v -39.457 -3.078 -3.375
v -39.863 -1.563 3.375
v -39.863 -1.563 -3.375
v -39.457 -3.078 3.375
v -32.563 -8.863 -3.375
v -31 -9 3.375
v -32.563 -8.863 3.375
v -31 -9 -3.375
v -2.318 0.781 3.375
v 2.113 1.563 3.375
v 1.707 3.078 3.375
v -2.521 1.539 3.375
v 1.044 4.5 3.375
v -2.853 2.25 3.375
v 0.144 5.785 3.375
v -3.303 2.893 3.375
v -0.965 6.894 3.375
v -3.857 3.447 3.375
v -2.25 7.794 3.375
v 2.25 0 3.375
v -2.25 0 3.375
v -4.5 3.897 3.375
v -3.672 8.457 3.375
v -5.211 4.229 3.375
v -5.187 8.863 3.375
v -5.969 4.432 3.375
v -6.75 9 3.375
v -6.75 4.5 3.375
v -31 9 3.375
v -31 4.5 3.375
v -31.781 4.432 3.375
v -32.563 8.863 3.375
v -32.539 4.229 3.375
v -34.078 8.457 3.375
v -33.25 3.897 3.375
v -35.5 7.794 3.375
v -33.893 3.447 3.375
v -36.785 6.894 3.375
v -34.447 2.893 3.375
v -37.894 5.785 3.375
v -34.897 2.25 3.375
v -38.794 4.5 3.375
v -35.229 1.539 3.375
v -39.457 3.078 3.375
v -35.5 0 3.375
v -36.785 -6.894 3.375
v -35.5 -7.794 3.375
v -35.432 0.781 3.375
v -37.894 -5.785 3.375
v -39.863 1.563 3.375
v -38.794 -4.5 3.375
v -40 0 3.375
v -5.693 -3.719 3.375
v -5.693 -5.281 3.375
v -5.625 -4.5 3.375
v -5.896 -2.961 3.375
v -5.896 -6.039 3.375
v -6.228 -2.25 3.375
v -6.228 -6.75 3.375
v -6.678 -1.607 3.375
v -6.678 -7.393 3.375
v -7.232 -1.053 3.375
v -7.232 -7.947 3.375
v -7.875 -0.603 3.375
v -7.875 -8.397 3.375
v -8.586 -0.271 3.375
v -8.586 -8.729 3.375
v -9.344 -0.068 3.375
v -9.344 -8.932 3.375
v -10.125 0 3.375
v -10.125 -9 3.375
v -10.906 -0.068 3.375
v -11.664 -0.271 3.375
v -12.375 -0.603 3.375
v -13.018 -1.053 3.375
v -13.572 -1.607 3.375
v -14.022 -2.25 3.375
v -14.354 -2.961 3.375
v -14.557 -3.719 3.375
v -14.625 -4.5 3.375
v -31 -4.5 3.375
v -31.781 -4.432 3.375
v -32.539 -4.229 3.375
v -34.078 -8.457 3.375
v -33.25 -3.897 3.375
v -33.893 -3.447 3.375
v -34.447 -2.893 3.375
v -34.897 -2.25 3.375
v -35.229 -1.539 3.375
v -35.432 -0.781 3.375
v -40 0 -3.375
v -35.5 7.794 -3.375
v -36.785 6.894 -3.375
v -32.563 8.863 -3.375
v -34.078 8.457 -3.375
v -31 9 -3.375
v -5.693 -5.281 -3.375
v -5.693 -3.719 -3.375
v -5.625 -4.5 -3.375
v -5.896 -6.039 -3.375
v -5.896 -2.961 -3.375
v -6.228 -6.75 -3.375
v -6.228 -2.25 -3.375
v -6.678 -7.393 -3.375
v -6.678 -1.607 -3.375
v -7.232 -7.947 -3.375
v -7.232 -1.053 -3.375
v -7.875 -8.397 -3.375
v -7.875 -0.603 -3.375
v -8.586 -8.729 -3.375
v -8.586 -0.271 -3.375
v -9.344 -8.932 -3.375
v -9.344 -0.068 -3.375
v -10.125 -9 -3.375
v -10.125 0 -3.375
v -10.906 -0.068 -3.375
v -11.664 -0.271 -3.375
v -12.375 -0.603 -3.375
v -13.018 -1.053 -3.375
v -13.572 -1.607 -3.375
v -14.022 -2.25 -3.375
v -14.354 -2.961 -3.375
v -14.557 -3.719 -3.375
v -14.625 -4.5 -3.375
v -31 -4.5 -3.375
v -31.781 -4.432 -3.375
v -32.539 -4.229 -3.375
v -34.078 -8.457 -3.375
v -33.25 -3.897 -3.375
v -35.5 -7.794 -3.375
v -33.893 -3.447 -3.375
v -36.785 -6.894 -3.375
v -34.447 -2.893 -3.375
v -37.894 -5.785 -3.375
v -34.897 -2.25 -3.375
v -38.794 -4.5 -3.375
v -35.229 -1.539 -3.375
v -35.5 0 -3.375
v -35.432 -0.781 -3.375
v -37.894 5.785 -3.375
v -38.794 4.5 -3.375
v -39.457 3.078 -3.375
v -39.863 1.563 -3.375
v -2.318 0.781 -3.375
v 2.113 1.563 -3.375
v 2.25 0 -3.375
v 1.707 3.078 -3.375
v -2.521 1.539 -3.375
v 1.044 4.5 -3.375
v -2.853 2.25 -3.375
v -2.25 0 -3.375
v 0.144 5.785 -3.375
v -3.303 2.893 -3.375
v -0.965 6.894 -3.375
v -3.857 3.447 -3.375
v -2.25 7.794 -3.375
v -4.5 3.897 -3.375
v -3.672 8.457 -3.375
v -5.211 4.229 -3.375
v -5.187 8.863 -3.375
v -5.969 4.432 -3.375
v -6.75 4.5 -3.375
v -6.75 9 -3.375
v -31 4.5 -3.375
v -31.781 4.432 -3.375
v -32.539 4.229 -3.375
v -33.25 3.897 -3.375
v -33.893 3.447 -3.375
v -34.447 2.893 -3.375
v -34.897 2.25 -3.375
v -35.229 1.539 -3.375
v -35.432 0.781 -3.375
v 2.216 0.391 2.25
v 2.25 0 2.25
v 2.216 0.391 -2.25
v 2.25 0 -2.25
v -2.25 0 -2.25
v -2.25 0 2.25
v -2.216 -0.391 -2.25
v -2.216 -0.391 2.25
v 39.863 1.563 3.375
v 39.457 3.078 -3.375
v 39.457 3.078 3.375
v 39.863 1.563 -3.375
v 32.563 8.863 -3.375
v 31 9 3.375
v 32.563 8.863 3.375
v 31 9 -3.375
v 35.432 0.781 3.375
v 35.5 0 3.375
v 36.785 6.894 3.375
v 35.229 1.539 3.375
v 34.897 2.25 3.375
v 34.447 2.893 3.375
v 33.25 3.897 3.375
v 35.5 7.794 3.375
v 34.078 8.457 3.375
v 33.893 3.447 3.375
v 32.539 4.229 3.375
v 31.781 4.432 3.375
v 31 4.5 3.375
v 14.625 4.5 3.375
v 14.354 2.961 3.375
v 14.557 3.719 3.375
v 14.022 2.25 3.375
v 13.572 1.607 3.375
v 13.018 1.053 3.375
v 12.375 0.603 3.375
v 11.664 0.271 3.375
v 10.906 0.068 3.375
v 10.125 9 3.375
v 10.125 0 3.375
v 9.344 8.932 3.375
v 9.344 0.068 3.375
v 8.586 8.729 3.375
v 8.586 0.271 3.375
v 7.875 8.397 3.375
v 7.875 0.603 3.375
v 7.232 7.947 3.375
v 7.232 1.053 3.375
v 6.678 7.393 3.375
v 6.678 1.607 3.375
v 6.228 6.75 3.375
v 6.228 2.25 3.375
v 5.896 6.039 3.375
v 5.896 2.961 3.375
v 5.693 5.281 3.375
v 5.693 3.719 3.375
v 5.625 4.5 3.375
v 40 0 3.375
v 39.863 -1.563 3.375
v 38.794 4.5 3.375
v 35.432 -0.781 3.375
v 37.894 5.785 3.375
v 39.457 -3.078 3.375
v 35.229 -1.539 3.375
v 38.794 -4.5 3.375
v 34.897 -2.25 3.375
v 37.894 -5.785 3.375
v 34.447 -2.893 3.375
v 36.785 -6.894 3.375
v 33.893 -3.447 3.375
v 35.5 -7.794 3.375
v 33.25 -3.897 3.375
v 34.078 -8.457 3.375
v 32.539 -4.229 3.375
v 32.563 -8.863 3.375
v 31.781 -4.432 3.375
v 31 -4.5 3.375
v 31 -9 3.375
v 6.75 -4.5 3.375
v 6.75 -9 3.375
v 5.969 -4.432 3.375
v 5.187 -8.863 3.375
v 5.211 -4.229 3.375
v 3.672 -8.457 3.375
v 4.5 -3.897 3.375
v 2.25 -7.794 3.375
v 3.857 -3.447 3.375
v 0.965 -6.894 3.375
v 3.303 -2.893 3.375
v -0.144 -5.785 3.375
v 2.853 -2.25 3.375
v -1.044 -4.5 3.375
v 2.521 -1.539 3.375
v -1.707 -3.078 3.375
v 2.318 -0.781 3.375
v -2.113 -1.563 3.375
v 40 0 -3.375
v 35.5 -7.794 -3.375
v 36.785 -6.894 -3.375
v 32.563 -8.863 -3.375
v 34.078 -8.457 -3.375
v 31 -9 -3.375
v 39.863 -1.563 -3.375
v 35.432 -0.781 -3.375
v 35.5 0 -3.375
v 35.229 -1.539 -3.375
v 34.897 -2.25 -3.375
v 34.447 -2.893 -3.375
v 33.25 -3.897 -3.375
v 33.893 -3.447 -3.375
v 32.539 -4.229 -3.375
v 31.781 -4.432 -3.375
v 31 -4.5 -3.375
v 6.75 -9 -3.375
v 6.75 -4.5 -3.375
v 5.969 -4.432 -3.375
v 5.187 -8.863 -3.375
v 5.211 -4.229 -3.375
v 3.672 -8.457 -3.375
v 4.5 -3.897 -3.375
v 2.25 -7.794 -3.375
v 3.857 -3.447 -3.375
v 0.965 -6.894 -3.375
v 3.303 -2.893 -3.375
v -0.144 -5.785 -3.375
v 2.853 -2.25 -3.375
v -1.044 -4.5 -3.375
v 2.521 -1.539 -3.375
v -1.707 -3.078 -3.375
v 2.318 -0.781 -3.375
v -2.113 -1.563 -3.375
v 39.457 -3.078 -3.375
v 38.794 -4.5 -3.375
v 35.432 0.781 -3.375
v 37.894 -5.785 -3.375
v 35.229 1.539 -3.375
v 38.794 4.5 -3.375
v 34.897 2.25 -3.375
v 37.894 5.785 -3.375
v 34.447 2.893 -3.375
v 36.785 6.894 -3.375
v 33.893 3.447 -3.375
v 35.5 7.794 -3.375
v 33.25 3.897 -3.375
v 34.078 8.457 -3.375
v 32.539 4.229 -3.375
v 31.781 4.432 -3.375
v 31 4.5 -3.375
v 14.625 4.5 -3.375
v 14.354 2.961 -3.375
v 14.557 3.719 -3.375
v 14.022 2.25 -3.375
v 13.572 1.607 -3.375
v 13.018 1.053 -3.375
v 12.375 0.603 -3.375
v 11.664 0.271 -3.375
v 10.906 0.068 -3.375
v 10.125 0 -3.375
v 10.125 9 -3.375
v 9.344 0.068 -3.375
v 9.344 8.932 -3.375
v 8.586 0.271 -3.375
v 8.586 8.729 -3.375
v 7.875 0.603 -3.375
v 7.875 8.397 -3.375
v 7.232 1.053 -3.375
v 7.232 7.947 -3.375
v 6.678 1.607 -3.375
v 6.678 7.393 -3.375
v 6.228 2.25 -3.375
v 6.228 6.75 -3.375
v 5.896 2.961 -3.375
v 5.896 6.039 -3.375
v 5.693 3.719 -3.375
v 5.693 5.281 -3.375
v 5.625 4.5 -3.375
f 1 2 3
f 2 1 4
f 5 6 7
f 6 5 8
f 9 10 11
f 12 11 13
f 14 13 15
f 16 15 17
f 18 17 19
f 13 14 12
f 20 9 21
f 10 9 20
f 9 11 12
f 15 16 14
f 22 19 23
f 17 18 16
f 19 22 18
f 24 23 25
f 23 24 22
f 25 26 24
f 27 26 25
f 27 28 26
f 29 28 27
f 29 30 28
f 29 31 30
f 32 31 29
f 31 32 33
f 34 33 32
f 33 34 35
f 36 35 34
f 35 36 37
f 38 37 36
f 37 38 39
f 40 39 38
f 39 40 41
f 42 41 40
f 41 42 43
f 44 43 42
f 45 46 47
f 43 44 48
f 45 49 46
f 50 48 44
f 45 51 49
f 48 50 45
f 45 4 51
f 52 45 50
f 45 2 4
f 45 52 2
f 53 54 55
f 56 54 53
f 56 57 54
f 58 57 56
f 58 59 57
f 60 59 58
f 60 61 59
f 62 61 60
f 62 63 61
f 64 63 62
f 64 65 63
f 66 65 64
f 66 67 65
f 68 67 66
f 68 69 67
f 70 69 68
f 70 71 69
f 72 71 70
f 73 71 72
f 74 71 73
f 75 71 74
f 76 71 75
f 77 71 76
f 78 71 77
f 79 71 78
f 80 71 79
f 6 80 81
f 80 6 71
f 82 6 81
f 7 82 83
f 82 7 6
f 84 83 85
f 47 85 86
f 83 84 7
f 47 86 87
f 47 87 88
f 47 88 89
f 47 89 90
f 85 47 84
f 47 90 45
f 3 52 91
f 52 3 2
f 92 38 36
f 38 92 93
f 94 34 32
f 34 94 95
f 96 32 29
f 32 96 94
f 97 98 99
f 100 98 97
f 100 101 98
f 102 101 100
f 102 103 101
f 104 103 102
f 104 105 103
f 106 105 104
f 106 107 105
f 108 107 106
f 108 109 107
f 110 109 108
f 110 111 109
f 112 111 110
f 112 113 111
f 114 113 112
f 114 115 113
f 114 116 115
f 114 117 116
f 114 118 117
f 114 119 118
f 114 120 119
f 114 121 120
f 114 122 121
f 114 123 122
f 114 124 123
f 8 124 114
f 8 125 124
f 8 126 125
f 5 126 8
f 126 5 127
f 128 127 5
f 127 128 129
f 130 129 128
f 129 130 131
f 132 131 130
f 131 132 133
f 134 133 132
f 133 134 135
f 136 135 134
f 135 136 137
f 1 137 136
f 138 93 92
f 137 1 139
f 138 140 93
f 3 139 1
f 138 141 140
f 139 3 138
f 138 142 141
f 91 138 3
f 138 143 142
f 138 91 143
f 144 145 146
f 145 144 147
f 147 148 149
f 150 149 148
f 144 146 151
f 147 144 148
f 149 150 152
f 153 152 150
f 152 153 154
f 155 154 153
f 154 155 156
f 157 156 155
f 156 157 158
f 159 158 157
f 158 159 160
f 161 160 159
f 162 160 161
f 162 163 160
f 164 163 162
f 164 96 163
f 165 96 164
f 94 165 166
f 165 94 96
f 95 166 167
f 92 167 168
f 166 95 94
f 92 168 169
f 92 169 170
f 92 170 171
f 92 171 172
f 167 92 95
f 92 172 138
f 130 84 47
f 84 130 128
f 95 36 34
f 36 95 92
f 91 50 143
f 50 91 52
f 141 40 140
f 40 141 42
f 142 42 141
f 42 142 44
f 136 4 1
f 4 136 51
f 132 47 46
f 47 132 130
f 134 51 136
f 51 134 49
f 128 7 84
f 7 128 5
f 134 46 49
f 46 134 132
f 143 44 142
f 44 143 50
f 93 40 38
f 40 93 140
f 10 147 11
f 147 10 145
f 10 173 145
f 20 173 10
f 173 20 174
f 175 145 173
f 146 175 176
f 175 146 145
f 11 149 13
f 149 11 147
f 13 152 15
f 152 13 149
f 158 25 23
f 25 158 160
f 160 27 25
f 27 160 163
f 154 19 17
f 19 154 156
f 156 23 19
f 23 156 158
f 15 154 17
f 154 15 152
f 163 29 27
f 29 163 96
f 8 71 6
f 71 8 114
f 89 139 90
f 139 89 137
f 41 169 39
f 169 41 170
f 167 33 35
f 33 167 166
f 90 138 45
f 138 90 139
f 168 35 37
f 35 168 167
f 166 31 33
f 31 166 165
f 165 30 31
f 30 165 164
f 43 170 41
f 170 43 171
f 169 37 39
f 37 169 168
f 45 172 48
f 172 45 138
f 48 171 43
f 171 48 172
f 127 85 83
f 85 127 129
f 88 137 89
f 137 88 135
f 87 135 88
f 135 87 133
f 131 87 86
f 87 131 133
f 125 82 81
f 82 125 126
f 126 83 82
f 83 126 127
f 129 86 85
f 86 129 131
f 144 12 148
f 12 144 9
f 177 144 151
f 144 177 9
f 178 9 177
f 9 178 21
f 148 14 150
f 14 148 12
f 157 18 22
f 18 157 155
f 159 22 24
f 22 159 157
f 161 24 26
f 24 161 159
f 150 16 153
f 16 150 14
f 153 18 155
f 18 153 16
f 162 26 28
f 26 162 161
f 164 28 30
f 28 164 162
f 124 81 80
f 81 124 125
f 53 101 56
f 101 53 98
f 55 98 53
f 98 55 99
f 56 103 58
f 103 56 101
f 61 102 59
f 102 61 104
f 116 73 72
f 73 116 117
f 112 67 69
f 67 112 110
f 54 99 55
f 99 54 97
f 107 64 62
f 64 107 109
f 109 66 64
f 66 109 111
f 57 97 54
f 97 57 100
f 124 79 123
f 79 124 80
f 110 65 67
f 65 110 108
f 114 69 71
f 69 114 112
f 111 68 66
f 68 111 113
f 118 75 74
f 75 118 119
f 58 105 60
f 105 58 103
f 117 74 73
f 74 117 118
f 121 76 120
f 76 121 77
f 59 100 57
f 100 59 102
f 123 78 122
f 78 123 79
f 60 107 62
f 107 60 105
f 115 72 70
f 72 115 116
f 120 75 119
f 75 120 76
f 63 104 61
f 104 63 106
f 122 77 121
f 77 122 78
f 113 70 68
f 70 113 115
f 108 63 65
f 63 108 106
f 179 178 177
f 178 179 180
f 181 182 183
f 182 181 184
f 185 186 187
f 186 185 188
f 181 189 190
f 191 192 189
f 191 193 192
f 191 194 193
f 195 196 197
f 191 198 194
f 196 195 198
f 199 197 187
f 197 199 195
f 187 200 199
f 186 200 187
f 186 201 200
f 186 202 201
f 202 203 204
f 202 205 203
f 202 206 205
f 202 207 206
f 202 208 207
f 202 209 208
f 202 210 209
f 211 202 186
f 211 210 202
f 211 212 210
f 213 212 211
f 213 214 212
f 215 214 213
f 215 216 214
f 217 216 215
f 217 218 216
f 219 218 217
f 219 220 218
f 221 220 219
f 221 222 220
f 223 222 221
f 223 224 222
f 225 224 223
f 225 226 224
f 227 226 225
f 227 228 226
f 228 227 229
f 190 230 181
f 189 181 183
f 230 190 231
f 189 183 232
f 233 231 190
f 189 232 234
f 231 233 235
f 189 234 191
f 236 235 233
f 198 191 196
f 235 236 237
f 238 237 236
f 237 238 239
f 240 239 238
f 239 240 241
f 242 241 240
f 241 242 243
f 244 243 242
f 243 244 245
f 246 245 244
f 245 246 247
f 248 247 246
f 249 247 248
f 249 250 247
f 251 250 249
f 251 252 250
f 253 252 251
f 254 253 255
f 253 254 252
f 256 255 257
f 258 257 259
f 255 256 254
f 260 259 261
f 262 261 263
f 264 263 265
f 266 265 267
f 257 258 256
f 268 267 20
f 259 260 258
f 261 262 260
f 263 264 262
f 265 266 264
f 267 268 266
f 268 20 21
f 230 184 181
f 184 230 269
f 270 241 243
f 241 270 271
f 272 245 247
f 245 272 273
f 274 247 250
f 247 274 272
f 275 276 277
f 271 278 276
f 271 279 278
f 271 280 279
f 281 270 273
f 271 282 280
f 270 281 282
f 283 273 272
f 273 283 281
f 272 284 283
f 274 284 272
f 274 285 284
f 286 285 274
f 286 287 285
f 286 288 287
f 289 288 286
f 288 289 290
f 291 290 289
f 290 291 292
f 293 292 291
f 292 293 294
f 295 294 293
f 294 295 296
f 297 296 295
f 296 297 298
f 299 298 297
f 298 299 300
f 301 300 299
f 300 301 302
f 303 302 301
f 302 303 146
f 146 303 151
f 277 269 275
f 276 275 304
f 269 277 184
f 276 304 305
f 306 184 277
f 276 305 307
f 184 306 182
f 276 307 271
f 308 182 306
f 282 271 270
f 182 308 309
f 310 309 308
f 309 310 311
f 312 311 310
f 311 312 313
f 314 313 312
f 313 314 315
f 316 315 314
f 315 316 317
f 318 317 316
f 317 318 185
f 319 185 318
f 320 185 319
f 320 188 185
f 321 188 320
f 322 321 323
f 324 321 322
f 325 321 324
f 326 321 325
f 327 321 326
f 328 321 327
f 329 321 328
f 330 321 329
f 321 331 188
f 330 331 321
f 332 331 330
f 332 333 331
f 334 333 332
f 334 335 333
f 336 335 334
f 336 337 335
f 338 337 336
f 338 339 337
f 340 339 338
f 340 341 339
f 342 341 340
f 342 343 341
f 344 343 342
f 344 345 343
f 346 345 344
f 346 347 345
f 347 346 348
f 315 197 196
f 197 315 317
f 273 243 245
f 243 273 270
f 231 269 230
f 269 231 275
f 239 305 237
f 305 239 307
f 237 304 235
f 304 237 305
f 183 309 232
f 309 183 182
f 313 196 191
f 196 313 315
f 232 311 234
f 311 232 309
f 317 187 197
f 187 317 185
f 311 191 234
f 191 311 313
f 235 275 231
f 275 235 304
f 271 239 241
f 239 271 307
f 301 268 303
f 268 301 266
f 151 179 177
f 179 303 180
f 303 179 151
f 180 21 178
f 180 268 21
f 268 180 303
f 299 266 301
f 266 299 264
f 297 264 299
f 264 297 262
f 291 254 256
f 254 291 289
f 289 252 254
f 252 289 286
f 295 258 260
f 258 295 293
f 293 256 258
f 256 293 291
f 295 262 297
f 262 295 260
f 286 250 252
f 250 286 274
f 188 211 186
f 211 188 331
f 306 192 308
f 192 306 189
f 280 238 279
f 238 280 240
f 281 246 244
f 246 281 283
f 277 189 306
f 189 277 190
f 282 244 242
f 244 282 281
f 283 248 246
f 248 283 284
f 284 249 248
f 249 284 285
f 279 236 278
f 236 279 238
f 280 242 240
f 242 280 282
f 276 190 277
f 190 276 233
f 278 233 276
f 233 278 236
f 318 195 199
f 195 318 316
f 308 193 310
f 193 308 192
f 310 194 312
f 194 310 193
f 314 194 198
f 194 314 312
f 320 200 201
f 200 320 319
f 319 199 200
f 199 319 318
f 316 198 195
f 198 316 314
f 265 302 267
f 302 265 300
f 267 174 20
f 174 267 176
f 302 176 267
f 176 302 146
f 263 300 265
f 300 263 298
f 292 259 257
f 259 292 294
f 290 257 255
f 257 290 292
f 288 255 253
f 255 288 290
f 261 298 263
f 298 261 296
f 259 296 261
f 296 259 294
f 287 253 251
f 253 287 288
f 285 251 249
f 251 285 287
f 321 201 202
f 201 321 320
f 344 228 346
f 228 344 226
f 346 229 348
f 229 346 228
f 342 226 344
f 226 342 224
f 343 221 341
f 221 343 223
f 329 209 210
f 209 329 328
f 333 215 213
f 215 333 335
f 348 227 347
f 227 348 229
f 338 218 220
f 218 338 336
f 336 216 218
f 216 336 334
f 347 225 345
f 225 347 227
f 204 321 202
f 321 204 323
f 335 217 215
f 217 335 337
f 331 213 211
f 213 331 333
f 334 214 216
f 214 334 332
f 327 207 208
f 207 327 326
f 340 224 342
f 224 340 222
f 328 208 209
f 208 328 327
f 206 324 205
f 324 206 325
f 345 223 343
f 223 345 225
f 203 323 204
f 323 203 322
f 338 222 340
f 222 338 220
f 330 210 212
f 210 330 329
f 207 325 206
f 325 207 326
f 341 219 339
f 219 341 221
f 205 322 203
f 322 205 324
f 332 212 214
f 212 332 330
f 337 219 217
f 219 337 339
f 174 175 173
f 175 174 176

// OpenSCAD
// Backpack Cord Clip
// This clip will hold together your backpack cords in the center of your chest
// so the cords will not slip from your soulder.

// (mm)
Total_Length=80; // [10:200]
// (mm)
Cord_Diameter=9; // [1:20]

Inner_Length=(Total_Length/2)-Cord_Diameter*2+Cord_Diameter/4;
Round_Edge=0+0;
// uncomment next line to have rounded edges, but it will render quite slow
//Round_Edge=Cord_Diameter/2.1;

// set low resolution for faster preview and high resolution for rendering
$fn = $preview ? 12 : 36;

module semi_clip()
{
    union()
    {
        difference() {
            // outer figure
            union()
            {
                translate([-Inner_Length/2,0,0])
                    cylinder(h=Cord_Diameter/2*1.5-Round_Edge,d=Cord_Diameter*2-Round_Edge,center=true);
                translate([Inner_Length/2,0,0])
                    cylinder(h=Cord_Diameter/2*1.5-Round_Edge,d=Cord_Diameter*2-Round_Edge,center=true);
                cube([Inner_Length,Cord_Diameter*2,Cord_Diameter/2*1.5],center=true);
            }
            // inner cutout
            union()
            {
                translate([-Inner_Length/2,0,0])
                    cylinder(h=Cord_Diameter+1,d=Cord_Diameter+Round_Edge,center=true);
                translate([Inner_Length/2,0,0])
                    cylinder(h=Cord_Diameter+1,d=Cord_Diameter+Round_Edge,center=true);
                cube([Inner_Length,Cord_Diameter,Cord_Diameter/2*1.5+1],center=true);
            }
            translate([Total_Length/4-Cord_Diameter/4,-Cord_Diameter,0])
                cube([Cord_Diameter*2,Cord_Diameter*2,Cord_Diameter+1],center=true);
        }
        translate([Total_Length/4-Cord_Diameter/4-Cord_Diameter,-Cord_Diameter/2,0])
            cylinder(h=Cord_Diameter/2*1.5-Round_Edge,d=Cord_Diameter-Round_Edge,center=true);
        translate([Total_Length/4-Cord_Diameter/8,0,0])
            cylinder(h=Cord_Diameter/2-Round_Edge,d=Cord_Diameter/2-Round_Edge,center=true);
    }
}

// round the edges of the figure
//minkowski()
{
    union()
    {
        translate([-(Total_Length/4-Cord_Diameter/8),0,0])
            semi_clip();
        
        translate([(Total_Length/4-Cord_Diameter/8),0,0])
            rotate([180,180,0])
                semi_clip();
    }

//    sphere(Round_Edge/2);
}
